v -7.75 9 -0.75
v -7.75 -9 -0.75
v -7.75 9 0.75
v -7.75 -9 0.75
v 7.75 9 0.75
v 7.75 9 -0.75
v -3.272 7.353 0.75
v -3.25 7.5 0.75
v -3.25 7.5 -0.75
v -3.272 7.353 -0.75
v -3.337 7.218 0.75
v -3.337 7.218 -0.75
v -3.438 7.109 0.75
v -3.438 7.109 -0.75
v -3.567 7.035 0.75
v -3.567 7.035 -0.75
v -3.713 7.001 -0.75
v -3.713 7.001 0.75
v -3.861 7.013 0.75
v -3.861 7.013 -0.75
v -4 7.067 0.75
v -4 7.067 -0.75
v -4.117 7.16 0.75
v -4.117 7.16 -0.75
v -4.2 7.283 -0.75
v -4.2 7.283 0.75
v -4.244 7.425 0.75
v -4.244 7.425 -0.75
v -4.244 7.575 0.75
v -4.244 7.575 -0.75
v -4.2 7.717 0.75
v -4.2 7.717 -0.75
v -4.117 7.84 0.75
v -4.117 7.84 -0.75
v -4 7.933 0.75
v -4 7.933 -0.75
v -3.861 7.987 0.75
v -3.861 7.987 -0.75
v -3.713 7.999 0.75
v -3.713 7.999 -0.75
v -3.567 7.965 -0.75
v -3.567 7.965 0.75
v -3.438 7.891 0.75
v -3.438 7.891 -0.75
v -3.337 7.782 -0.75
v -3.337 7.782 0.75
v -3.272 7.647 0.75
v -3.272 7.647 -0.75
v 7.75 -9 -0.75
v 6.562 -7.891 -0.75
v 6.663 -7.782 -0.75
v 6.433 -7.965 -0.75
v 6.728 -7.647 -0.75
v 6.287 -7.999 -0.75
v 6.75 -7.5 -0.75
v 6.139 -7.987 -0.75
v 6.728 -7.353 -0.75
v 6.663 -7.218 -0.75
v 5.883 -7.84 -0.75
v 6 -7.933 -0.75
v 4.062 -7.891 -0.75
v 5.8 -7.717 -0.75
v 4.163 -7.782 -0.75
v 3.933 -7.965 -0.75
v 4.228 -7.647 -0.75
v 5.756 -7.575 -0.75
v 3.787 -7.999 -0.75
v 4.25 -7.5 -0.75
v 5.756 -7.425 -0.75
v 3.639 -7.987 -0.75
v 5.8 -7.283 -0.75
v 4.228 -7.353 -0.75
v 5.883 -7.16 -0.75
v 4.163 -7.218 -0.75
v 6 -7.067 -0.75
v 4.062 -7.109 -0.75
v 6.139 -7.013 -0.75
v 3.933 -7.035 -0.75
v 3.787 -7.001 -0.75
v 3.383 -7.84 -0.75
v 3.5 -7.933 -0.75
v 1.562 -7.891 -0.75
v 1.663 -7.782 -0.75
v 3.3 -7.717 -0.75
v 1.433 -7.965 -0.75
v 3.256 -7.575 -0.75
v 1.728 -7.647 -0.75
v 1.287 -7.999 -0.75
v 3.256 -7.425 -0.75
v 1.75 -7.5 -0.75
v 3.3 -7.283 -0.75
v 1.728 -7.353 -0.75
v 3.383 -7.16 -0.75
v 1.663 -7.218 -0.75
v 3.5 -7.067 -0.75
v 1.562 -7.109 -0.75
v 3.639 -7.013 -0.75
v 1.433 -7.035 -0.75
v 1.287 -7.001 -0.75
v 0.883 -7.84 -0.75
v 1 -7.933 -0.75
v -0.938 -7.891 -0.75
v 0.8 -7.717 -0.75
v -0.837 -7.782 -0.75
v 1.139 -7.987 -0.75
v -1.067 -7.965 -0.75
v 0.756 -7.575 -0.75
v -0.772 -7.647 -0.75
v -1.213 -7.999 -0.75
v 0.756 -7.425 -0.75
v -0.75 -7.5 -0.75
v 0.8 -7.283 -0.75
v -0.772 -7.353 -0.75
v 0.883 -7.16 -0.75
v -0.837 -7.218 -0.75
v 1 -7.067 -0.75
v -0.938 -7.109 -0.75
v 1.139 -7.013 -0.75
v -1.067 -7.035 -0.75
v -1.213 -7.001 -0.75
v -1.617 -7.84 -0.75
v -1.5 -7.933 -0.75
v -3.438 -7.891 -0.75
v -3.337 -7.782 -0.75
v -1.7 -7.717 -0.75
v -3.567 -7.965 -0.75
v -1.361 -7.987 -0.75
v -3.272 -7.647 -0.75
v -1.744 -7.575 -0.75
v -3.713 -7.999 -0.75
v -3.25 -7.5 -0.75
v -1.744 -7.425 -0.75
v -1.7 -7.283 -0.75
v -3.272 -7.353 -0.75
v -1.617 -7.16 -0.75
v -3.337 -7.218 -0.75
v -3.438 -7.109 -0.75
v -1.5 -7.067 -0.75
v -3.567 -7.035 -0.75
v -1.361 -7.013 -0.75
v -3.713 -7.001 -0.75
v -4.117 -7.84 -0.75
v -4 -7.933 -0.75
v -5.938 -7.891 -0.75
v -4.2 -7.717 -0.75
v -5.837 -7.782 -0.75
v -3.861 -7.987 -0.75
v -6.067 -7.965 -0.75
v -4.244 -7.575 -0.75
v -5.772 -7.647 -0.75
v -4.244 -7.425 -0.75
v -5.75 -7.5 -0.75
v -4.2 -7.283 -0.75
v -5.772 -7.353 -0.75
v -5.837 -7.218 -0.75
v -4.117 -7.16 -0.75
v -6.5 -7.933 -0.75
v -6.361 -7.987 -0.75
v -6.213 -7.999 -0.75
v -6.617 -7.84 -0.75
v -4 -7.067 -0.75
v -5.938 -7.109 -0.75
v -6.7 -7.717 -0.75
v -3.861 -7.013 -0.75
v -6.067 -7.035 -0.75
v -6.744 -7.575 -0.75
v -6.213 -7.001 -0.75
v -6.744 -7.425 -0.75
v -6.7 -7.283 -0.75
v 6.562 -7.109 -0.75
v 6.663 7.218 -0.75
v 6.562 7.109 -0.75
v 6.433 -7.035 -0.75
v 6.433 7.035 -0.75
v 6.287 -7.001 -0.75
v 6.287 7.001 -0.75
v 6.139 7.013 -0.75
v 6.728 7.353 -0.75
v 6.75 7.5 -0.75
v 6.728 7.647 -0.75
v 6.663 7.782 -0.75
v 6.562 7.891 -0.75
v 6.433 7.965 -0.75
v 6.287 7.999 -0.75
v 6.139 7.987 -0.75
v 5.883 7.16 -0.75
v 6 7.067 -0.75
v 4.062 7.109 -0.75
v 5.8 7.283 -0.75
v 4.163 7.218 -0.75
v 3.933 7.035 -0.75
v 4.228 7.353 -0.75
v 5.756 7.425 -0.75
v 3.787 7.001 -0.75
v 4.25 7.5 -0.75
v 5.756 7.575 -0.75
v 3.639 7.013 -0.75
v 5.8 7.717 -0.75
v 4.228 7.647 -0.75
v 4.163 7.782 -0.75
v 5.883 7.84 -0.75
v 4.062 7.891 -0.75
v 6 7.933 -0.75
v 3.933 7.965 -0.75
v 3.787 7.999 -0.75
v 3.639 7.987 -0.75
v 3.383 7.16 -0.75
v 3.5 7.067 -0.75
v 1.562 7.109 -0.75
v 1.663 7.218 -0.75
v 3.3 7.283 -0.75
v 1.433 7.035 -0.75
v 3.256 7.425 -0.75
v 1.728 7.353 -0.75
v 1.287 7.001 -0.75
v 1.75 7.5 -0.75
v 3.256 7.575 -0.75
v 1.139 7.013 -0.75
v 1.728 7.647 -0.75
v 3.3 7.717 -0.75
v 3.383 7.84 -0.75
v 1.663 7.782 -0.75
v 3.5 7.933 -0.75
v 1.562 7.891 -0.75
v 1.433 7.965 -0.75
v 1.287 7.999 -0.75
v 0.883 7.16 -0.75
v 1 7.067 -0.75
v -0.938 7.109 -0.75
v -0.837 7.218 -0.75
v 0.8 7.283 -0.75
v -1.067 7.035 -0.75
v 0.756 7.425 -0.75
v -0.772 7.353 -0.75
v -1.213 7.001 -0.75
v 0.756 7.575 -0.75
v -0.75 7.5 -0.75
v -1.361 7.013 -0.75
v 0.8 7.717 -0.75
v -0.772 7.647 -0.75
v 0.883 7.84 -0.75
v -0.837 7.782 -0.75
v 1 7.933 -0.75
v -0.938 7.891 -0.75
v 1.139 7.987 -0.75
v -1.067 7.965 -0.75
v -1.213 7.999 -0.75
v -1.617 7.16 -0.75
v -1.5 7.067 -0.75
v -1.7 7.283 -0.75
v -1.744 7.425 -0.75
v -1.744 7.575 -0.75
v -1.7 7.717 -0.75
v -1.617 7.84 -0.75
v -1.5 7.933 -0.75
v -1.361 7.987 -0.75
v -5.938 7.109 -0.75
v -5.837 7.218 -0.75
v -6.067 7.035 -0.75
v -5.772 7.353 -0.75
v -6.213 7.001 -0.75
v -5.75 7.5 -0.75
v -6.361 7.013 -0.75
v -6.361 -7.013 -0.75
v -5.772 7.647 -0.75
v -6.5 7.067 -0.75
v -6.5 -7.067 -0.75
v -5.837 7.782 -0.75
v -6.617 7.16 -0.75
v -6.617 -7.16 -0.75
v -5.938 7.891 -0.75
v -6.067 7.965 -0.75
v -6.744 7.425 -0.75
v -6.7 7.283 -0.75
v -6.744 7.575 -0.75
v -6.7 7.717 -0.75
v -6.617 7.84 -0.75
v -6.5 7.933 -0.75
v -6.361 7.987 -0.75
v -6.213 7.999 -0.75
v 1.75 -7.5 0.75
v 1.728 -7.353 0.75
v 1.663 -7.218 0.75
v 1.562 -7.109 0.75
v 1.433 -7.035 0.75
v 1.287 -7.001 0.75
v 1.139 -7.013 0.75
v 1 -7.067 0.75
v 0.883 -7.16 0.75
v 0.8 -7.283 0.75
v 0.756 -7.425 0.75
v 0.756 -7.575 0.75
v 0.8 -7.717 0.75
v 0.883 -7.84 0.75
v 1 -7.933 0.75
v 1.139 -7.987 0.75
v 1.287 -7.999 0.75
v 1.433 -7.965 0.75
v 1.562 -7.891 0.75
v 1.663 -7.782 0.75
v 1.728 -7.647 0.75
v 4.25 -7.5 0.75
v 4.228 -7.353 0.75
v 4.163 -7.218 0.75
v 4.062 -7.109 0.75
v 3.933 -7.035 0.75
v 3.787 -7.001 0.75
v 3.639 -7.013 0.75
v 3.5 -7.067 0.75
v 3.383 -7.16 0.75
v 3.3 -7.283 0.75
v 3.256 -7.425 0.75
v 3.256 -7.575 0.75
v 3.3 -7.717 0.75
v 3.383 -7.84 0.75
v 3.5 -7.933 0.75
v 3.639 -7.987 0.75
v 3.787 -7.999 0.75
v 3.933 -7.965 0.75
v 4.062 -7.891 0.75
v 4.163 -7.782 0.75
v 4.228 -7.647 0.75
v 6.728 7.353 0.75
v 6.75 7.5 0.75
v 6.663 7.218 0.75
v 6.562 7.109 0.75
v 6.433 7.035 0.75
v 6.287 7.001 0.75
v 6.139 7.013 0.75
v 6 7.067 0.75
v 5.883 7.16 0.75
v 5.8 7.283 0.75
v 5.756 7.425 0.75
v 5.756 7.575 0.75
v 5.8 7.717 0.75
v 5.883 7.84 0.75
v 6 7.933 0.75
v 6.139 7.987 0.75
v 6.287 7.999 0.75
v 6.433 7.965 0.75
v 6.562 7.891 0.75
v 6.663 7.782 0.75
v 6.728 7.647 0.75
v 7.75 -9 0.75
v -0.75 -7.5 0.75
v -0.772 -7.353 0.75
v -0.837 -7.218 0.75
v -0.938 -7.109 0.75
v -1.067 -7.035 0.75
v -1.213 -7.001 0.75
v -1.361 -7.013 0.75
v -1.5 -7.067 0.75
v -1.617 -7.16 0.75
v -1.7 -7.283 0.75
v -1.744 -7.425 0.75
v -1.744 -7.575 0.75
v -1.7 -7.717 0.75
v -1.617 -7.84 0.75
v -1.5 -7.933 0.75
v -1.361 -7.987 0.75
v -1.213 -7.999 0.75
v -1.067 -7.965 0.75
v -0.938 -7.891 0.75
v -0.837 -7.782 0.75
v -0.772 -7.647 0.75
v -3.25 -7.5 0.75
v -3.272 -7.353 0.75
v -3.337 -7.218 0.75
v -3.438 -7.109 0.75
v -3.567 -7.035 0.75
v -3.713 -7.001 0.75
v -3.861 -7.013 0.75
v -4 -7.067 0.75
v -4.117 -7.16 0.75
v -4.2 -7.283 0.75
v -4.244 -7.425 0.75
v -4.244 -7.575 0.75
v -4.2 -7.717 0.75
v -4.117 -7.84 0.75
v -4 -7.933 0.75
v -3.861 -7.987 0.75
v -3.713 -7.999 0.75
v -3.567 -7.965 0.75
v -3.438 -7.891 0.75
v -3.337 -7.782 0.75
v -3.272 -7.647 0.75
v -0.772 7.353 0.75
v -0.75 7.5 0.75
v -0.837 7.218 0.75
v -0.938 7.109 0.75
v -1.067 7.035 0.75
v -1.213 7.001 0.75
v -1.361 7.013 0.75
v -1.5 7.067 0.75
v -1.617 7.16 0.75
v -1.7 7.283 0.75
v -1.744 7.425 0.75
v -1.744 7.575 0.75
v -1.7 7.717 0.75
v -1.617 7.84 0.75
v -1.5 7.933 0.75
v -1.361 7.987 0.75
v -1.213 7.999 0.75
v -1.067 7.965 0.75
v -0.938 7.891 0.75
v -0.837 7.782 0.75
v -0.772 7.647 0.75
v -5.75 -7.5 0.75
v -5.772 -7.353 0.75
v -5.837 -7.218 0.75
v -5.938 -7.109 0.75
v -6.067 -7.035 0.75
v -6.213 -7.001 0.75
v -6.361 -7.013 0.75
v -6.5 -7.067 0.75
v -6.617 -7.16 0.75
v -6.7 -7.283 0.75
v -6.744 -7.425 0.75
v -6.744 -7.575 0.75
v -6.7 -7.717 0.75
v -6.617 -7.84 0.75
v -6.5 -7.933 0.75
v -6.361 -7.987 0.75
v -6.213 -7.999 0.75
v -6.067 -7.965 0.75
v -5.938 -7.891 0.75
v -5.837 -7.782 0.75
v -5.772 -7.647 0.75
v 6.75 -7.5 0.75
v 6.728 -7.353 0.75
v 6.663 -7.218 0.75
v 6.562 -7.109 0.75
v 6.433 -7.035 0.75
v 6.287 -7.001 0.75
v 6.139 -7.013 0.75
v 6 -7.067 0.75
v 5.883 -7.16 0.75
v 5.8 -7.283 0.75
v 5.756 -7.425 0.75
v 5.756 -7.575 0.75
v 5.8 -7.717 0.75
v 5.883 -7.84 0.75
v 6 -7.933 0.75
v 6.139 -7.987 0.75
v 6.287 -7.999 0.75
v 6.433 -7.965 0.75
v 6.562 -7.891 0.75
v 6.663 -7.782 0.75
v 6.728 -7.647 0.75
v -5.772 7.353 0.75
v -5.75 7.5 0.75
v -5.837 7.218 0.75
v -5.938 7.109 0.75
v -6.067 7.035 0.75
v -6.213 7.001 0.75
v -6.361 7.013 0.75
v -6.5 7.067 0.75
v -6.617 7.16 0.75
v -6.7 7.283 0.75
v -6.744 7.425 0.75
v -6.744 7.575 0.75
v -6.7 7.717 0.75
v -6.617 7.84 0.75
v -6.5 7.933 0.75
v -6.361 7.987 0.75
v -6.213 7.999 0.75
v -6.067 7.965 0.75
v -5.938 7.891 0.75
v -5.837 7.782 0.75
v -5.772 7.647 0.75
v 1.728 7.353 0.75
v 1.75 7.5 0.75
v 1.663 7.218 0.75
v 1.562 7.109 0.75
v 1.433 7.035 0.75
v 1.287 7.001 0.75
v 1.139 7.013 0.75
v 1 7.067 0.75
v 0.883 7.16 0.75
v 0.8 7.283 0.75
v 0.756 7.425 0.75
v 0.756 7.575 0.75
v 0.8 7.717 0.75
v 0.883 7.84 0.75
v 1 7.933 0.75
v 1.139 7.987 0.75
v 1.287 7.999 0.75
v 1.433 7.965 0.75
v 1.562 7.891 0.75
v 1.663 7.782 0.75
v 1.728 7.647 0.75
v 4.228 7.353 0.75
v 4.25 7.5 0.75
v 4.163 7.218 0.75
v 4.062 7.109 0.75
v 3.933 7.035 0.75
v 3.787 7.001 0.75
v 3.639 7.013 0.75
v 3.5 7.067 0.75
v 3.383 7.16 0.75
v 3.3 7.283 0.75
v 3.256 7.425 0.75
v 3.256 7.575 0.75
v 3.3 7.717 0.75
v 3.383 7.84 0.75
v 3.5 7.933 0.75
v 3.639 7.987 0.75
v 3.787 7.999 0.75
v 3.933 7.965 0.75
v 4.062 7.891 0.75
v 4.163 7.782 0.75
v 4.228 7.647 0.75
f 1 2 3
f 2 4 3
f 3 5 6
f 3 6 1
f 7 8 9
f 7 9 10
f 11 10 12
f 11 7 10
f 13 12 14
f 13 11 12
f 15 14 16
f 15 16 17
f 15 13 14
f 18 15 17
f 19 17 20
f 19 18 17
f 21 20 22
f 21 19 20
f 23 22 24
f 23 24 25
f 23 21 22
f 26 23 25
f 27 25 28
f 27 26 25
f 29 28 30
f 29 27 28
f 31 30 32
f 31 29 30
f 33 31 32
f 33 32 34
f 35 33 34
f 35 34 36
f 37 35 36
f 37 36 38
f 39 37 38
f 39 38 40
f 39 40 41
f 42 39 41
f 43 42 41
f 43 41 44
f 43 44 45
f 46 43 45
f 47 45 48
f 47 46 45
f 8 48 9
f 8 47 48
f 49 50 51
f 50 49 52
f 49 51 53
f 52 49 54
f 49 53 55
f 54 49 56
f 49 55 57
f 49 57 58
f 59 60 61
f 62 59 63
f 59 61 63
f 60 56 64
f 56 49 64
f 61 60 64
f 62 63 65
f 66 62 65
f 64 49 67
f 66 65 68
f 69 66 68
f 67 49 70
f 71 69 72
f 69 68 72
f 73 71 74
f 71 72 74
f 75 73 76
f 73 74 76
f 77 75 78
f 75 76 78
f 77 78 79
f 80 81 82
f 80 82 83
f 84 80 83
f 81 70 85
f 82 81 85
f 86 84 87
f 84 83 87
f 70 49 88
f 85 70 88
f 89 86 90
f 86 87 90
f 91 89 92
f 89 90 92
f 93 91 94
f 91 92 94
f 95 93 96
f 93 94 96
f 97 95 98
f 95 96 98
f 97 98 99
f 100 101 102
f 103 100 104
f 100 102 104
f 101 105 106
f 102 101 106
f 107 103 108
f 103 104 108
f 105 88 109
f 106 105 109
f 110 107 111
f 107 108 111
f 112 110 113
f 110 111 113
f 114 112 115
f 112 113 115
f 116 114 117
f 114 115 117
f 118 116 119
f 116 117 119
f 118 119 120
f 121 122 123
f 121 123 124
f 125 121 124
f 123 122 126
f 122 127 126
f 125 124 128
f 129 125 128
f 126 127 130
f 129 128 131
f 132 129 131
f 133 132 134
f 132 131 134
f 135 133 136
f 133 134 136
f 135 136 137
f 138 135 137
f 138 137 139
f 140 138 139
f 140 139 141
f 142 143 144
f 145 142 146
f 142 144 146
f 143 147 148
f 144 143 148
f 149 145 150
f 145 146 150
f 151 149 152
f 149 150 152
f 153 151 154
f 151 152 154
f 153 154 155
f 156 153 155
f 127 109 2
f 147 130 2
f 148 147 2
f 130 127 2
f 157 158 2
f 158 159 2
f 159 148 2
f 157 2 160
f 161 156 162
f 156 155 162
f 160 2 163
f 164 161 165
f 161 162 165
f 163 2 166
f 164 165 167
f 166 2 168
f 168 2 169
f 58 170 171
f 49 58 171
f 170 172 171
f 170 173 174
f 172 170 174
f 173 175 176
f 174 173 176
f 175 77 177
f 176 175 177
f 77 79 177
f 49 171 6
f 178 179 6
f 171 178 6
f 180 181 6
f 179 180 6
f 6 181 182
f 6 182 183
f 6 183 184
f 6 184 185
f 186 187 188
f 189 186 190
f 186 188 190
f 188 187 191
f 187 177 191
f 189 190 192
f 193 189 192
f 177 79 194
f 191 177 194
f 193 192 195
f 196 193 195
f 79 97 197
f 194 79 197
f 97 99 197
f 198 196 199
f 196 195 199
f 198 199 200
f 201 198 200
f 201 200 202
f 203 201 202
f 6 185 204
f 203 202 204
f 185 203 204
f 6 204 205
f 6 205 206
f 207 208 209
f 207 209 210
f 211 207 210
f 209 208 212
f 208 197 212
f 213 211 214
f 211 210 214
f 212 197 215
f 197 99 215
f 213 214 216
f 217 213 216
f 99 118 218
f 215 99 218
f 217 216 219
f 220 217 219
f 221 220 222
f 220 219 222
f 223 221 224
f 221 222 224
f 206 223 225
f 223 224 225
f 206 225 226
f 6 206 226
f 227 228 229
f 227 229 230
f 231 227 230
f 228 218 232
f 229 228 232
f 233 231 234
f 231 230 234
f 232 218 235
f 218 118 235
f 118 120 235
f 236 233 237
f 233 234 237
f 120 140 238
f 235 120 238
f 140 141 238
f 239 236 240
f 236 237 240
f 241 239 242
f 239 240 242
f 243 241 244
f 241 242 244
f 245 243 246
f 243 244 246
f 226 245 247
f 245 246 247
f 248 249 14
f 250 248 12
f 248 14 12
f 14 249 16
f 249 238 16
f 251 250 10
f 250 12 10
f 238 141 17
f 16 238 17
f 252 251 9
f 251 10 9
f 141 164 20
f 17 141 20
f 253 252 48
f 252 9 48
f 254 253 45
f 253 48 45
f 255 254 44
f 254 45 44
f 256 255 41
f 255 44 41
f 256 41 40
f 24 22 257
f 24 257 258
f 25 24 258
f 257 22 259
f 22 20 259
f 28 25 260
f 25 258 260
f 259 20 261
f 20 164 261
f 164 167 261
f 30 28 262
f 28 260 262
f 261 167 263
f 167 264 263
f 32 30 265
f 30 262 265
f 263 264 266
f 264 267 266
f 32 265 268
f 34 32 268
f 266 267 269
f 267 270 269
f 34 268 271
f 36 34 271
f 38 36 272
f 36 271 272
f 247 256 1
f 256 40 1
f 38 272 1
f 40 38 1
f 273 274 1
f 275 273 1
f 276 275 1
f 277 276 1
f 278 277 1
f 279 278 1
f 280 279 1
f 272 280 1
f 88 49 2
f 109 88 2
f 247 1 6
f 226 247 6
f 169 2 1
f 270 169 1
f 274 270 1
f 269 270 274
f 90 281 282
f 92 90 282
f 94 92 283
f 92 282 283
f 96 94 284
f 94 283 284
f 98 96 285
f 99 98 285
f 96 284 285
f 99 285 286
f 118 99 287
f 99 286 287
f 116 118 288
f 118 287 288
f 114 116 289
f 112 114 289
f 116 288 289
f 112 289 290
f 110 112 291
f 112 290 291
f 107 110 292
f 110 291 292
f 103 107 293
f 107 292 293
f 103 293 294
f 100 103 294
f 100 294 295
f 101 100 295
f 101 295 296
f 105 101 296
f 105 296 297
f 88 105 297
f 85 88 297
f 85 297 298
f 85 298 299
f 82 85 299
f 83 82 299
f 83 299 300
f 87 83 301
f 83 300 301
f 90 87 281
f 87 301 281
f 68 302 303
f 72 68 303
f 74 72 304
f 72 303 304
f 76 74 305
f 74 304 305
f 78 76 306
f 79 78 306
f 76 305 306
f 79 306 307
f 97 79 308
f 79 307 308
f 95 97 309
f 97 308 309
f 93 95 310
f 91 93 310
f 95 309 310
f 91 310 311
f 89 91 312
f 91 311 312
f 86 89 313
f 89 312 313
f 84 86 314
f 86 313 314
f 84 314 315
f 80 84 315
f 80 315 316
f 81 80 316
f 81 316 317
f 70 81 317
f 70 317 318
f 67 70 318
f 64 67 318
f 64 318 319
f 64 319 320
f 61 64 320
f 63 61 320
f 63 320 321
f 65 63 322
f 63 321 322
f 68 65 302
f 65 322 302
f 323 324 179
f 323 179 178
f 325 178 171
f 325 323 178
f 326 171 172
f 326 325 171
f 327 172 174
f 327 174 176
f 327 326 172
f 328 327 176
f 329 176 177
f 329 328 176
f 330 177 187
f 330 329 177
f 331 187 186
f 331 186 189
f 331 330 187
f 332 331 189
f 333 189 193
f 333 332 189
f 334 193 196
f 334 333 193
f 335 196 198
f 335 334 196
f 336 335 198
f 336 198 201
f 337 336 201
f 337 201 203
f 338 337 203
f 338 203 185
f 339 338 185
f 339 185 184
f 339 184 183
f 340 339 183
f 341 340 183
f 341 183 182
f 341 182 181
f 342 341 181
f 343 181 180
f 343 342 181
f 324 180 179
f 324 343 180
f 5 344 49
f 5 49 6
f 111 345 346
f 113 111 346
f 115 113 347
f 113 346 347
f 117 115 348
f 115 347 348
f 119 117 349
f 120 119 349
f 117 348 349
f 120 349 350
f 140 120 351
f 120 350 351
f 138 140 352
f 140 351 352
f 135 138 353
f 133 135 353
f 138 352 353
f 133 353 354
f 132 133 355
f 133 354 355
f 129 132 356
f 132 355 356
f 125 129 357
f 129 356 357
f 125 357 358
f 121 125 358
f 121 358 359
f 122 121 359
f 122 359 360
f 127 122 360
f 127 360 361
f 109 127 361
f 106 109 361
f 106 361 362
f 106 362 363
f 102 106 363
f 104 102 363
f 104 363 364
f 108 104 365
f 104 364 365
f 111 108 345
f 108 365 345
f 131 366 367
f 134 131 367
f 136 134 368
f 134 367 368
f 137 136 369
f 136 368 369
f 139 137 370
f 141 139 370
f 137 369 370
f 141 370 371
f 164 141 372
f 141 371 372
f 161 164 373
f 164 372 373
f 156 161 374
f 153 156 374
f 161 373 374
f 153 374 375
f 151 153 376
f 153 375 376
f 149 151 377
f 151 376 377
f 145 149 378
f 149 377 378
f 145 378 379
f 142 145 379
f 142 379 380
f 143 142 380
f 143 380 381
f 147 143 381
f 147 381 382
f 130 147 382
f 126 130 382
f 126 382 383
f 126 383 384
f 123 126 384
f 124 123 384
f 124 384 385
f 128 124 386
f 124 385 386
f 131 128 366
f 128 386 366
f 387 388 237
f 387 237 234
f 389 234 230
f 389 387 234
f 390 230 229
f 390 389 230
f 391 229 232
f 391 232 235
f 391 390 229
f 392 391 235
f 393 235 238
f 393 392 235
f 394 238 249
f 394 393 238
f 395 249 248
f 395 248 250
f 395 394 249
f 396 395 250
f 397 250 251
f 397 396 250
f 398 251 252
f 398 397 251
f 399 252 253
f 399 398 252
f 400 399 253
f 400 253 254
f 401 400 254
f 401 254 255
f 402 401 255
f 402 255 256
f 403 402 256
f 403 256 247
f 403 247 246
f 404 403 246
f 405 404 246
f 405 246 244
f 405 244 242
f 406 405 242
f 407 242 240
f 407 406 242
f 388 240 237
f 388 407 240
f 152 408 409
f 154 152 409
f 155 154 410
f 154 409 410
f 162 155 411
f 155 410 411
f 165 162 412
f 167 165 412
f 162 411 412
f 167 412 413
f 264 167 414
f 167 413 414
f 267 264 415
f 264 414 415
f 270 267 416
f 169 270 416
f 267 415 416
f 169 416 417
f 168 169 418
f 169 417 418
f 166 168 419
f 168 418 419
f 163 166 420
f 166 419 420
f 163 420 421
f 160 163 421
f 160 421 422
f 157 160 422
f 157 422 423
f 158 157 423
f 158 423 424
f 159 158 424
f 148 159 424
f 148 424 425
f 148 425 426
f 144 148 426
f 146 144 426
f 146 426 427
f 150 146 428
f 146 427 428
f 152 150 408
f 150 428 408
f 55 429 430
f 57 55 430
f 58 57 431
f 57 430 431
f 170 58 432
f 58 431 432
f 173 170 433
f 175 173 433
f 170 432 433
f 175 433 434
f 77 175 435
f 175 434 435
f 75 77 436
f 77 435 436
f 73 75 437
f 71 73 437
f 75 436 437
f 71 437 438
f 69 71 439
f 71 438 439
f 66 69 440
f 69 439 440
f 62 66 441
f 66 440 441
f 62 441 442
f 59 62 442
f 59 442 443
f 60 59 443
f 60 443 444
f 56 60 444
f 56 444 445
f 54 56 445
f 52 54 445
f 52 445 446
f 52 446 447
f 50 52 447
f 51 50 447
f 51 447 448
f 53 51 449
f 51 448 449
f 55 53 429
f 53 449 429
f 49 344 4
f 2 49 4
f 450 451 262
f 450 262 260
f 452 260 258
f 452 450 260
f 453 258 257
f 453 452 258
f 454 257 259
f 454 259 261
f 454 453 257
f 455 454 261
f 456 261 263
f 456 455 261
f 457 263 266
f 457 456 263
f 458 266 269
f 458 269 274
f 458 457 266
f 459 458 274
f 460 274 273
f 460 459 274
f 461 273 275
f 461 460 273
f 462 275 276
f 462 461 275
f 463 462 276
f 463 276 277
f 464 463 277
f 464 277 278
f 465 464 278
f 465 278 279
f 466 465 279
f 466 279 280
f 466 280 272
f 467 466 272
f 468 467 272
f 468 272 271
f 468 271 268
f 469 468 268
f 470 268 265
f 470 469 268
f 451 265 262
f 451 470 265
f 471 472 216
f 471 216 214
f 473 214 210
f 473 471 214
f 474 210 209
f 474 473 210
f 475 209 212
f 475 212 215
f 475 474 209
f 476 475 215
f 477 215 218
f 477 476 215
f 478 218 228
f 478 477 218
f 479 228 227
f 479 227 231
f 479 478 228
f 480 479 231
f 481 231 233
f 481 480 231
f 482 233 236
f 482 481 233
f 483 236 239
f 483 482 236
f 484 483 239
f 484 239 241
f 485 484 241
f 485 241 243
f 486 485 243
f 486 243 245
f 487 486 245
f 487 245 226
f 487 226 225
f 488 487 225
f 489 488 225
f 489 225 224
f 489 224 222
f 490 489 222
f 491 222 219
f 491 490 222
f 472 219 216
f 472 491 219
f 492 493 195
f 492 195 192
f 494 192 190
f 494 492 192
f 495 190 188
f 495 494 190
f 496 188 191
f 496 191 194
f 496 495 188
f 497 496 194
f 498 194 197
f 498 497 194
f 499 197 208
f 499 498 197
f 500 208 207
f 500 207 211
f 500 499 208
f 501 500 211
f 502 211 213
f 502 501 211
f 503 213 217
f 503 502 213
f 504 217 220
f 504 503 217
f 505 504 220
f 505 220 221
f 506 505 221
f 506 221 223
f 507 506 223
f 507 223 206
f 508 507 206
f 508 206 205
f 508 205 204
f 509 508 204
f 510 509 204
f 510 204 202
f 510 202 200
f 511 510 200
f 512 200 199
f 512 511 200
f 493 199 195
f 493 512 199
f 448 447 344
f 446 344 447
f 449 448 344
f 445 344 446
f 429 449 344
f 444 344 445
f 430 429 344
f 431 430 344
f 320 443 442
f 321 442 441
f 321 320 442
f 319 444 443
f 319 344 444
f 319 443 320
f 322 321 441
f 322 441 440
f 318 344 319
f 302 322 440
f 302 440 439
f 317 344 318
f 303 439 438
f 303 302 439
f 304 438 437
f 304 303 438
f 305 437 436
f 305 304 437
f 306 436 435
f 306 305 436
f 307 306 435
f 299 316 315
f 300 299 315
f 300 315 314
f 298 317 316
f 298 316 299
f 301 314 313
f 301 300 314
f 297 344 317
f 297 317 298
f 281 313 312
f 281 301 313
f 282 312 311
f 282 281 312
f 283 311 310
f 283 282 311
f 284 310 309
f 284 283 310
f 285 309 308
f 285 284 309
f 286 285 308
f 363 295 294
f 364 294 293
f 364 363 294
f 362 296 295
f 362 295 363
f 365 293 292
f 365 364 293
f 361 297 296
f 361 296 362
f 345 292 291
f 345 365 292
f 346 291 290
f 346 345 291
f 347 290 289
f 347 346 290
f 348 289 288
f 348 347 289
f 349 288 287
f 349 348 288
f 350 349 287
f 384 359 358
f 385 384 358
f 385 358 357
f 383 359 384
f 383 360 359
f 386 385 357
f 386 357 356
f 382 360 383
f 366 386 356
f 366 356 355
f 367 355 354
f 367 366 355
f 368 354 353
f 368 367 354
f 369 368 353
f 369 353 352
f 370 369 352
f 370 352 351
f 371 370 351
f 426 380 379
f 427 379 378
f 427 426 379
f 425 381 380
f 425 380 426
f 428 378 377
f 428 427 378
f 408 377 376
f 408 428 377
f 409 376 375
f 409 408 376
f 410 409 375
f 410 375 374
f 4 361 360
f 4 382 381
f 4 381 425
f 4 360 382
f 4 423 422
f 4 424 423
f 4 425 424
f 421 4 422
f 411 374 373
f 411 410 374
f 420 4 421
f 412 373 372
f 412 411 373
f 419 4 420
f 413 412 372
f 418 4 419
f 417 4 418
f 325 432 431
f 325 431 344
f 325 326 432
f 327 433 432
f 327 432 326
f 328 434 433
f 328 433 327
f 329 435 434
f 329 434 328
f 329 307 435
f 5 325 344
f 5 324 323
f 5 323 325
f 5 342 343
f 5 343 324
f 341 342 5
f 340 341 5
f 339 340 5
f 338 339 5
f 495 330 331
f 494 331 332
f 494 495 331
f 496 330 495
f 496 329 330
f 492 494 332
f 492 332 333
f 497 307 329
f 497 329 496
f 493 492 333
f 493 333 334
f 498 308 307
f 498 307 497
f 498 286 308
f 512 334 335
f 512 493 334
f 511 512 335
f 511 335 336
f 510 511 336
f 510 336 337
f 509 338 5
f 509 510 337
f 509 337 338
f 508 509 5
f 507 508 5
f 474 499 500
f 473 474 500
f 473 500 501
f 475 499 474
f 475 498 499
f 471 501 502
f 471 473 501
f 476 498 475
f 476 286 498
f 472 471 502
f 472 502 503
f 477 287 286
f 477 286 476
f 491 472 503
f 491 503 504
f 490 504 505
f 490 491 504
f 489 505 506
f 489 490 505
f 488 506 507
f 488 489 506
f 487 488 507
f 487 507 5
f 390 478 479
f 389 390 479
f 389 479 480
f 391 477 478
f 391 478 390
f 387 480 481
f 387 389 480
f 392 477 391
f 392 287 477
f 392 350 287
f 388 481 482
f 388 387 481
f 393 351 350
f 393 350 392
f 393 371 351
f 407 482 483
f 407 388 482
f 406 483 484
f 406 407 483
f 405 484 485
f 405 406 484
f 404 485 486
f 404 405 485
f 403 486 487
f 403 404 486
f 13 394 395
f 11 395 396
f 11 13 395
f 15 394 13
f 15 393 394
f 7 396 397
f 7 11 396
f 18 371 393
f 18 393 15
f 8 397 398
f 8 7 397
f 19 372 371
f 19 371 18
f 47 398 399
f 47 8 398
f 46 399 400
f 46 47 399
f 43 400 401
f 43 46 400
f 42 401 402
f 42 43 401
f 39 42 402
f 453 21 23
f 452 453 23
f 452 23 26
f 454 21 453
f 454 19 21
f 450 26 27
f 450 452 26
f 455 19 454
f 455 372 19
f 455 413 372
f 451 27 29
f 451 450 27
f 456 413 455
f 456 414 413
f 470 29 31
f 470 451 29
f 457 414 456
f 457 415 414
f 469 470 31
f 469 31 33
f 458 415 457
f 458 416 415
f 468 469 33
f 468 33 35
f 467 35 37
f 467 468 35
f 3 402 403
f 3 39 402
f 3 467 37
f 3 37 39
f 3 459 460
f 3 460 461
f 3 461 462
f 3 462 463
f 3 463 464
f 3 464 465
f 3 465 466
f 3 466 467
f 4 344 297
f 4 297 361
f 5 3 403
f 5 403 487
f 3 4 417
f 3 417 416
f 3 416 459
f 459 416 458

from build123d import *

# Parameters (mm, degrees)
SKETCH1_W           = 18
SKETCH1_H           = 15.5
BOSS_EXTRUDE1_DEPTH = 0.75
SKETCH2_R           = 0.5
CUT_EXTRUDE1_DEPTH  = 1.5


with BuildPart() as part:
    # Sketch1 → Boss-Extrude1 (new, symmetric)
    with BuildSketch(Plane(origin=(0, 0, 0), x_dir=(0, 1, 0), z_dir=(0, 0, 1))):
        Rectangle(SKETCH1_W, SKETCH1_H)
    extrude(amount=BOSS_EXTRUDE1_DEPTH, both=True)

    # Sketch2 → Cut-Extrude1 (cut)
    with BuildSketch(Plane.XY.offset(0.75)):
        with Locations((-6.25, -7.5)):
            Circle(SKETCH2_R)
        with Locations((-3.75, -7.5)):
            Circle(SKETCH2_R)
        with Locations((-1.25, -7.5)):
            Circle(SKETCH2_R)
        with Locations((1.25, -7.5)):
            Circle(SKETCH2_R)
        with Locations((3.75, -7.5)):
            Circle(SKETCH2_R)
        with Locations((6.25, -7.5)):
            Circle(SKETCH2_R)
    cut_extrude1 = extrude(amount=-CUT_EXTRUDE1_DEPTH, mode=Mode.SUBTRACT)

    # Mirror1: Cut-Extrude1 across plane
    add(cut_extrude1.mirror(Plane.ZX), mode=Mode.SUBTRACT)


solid = part.part
